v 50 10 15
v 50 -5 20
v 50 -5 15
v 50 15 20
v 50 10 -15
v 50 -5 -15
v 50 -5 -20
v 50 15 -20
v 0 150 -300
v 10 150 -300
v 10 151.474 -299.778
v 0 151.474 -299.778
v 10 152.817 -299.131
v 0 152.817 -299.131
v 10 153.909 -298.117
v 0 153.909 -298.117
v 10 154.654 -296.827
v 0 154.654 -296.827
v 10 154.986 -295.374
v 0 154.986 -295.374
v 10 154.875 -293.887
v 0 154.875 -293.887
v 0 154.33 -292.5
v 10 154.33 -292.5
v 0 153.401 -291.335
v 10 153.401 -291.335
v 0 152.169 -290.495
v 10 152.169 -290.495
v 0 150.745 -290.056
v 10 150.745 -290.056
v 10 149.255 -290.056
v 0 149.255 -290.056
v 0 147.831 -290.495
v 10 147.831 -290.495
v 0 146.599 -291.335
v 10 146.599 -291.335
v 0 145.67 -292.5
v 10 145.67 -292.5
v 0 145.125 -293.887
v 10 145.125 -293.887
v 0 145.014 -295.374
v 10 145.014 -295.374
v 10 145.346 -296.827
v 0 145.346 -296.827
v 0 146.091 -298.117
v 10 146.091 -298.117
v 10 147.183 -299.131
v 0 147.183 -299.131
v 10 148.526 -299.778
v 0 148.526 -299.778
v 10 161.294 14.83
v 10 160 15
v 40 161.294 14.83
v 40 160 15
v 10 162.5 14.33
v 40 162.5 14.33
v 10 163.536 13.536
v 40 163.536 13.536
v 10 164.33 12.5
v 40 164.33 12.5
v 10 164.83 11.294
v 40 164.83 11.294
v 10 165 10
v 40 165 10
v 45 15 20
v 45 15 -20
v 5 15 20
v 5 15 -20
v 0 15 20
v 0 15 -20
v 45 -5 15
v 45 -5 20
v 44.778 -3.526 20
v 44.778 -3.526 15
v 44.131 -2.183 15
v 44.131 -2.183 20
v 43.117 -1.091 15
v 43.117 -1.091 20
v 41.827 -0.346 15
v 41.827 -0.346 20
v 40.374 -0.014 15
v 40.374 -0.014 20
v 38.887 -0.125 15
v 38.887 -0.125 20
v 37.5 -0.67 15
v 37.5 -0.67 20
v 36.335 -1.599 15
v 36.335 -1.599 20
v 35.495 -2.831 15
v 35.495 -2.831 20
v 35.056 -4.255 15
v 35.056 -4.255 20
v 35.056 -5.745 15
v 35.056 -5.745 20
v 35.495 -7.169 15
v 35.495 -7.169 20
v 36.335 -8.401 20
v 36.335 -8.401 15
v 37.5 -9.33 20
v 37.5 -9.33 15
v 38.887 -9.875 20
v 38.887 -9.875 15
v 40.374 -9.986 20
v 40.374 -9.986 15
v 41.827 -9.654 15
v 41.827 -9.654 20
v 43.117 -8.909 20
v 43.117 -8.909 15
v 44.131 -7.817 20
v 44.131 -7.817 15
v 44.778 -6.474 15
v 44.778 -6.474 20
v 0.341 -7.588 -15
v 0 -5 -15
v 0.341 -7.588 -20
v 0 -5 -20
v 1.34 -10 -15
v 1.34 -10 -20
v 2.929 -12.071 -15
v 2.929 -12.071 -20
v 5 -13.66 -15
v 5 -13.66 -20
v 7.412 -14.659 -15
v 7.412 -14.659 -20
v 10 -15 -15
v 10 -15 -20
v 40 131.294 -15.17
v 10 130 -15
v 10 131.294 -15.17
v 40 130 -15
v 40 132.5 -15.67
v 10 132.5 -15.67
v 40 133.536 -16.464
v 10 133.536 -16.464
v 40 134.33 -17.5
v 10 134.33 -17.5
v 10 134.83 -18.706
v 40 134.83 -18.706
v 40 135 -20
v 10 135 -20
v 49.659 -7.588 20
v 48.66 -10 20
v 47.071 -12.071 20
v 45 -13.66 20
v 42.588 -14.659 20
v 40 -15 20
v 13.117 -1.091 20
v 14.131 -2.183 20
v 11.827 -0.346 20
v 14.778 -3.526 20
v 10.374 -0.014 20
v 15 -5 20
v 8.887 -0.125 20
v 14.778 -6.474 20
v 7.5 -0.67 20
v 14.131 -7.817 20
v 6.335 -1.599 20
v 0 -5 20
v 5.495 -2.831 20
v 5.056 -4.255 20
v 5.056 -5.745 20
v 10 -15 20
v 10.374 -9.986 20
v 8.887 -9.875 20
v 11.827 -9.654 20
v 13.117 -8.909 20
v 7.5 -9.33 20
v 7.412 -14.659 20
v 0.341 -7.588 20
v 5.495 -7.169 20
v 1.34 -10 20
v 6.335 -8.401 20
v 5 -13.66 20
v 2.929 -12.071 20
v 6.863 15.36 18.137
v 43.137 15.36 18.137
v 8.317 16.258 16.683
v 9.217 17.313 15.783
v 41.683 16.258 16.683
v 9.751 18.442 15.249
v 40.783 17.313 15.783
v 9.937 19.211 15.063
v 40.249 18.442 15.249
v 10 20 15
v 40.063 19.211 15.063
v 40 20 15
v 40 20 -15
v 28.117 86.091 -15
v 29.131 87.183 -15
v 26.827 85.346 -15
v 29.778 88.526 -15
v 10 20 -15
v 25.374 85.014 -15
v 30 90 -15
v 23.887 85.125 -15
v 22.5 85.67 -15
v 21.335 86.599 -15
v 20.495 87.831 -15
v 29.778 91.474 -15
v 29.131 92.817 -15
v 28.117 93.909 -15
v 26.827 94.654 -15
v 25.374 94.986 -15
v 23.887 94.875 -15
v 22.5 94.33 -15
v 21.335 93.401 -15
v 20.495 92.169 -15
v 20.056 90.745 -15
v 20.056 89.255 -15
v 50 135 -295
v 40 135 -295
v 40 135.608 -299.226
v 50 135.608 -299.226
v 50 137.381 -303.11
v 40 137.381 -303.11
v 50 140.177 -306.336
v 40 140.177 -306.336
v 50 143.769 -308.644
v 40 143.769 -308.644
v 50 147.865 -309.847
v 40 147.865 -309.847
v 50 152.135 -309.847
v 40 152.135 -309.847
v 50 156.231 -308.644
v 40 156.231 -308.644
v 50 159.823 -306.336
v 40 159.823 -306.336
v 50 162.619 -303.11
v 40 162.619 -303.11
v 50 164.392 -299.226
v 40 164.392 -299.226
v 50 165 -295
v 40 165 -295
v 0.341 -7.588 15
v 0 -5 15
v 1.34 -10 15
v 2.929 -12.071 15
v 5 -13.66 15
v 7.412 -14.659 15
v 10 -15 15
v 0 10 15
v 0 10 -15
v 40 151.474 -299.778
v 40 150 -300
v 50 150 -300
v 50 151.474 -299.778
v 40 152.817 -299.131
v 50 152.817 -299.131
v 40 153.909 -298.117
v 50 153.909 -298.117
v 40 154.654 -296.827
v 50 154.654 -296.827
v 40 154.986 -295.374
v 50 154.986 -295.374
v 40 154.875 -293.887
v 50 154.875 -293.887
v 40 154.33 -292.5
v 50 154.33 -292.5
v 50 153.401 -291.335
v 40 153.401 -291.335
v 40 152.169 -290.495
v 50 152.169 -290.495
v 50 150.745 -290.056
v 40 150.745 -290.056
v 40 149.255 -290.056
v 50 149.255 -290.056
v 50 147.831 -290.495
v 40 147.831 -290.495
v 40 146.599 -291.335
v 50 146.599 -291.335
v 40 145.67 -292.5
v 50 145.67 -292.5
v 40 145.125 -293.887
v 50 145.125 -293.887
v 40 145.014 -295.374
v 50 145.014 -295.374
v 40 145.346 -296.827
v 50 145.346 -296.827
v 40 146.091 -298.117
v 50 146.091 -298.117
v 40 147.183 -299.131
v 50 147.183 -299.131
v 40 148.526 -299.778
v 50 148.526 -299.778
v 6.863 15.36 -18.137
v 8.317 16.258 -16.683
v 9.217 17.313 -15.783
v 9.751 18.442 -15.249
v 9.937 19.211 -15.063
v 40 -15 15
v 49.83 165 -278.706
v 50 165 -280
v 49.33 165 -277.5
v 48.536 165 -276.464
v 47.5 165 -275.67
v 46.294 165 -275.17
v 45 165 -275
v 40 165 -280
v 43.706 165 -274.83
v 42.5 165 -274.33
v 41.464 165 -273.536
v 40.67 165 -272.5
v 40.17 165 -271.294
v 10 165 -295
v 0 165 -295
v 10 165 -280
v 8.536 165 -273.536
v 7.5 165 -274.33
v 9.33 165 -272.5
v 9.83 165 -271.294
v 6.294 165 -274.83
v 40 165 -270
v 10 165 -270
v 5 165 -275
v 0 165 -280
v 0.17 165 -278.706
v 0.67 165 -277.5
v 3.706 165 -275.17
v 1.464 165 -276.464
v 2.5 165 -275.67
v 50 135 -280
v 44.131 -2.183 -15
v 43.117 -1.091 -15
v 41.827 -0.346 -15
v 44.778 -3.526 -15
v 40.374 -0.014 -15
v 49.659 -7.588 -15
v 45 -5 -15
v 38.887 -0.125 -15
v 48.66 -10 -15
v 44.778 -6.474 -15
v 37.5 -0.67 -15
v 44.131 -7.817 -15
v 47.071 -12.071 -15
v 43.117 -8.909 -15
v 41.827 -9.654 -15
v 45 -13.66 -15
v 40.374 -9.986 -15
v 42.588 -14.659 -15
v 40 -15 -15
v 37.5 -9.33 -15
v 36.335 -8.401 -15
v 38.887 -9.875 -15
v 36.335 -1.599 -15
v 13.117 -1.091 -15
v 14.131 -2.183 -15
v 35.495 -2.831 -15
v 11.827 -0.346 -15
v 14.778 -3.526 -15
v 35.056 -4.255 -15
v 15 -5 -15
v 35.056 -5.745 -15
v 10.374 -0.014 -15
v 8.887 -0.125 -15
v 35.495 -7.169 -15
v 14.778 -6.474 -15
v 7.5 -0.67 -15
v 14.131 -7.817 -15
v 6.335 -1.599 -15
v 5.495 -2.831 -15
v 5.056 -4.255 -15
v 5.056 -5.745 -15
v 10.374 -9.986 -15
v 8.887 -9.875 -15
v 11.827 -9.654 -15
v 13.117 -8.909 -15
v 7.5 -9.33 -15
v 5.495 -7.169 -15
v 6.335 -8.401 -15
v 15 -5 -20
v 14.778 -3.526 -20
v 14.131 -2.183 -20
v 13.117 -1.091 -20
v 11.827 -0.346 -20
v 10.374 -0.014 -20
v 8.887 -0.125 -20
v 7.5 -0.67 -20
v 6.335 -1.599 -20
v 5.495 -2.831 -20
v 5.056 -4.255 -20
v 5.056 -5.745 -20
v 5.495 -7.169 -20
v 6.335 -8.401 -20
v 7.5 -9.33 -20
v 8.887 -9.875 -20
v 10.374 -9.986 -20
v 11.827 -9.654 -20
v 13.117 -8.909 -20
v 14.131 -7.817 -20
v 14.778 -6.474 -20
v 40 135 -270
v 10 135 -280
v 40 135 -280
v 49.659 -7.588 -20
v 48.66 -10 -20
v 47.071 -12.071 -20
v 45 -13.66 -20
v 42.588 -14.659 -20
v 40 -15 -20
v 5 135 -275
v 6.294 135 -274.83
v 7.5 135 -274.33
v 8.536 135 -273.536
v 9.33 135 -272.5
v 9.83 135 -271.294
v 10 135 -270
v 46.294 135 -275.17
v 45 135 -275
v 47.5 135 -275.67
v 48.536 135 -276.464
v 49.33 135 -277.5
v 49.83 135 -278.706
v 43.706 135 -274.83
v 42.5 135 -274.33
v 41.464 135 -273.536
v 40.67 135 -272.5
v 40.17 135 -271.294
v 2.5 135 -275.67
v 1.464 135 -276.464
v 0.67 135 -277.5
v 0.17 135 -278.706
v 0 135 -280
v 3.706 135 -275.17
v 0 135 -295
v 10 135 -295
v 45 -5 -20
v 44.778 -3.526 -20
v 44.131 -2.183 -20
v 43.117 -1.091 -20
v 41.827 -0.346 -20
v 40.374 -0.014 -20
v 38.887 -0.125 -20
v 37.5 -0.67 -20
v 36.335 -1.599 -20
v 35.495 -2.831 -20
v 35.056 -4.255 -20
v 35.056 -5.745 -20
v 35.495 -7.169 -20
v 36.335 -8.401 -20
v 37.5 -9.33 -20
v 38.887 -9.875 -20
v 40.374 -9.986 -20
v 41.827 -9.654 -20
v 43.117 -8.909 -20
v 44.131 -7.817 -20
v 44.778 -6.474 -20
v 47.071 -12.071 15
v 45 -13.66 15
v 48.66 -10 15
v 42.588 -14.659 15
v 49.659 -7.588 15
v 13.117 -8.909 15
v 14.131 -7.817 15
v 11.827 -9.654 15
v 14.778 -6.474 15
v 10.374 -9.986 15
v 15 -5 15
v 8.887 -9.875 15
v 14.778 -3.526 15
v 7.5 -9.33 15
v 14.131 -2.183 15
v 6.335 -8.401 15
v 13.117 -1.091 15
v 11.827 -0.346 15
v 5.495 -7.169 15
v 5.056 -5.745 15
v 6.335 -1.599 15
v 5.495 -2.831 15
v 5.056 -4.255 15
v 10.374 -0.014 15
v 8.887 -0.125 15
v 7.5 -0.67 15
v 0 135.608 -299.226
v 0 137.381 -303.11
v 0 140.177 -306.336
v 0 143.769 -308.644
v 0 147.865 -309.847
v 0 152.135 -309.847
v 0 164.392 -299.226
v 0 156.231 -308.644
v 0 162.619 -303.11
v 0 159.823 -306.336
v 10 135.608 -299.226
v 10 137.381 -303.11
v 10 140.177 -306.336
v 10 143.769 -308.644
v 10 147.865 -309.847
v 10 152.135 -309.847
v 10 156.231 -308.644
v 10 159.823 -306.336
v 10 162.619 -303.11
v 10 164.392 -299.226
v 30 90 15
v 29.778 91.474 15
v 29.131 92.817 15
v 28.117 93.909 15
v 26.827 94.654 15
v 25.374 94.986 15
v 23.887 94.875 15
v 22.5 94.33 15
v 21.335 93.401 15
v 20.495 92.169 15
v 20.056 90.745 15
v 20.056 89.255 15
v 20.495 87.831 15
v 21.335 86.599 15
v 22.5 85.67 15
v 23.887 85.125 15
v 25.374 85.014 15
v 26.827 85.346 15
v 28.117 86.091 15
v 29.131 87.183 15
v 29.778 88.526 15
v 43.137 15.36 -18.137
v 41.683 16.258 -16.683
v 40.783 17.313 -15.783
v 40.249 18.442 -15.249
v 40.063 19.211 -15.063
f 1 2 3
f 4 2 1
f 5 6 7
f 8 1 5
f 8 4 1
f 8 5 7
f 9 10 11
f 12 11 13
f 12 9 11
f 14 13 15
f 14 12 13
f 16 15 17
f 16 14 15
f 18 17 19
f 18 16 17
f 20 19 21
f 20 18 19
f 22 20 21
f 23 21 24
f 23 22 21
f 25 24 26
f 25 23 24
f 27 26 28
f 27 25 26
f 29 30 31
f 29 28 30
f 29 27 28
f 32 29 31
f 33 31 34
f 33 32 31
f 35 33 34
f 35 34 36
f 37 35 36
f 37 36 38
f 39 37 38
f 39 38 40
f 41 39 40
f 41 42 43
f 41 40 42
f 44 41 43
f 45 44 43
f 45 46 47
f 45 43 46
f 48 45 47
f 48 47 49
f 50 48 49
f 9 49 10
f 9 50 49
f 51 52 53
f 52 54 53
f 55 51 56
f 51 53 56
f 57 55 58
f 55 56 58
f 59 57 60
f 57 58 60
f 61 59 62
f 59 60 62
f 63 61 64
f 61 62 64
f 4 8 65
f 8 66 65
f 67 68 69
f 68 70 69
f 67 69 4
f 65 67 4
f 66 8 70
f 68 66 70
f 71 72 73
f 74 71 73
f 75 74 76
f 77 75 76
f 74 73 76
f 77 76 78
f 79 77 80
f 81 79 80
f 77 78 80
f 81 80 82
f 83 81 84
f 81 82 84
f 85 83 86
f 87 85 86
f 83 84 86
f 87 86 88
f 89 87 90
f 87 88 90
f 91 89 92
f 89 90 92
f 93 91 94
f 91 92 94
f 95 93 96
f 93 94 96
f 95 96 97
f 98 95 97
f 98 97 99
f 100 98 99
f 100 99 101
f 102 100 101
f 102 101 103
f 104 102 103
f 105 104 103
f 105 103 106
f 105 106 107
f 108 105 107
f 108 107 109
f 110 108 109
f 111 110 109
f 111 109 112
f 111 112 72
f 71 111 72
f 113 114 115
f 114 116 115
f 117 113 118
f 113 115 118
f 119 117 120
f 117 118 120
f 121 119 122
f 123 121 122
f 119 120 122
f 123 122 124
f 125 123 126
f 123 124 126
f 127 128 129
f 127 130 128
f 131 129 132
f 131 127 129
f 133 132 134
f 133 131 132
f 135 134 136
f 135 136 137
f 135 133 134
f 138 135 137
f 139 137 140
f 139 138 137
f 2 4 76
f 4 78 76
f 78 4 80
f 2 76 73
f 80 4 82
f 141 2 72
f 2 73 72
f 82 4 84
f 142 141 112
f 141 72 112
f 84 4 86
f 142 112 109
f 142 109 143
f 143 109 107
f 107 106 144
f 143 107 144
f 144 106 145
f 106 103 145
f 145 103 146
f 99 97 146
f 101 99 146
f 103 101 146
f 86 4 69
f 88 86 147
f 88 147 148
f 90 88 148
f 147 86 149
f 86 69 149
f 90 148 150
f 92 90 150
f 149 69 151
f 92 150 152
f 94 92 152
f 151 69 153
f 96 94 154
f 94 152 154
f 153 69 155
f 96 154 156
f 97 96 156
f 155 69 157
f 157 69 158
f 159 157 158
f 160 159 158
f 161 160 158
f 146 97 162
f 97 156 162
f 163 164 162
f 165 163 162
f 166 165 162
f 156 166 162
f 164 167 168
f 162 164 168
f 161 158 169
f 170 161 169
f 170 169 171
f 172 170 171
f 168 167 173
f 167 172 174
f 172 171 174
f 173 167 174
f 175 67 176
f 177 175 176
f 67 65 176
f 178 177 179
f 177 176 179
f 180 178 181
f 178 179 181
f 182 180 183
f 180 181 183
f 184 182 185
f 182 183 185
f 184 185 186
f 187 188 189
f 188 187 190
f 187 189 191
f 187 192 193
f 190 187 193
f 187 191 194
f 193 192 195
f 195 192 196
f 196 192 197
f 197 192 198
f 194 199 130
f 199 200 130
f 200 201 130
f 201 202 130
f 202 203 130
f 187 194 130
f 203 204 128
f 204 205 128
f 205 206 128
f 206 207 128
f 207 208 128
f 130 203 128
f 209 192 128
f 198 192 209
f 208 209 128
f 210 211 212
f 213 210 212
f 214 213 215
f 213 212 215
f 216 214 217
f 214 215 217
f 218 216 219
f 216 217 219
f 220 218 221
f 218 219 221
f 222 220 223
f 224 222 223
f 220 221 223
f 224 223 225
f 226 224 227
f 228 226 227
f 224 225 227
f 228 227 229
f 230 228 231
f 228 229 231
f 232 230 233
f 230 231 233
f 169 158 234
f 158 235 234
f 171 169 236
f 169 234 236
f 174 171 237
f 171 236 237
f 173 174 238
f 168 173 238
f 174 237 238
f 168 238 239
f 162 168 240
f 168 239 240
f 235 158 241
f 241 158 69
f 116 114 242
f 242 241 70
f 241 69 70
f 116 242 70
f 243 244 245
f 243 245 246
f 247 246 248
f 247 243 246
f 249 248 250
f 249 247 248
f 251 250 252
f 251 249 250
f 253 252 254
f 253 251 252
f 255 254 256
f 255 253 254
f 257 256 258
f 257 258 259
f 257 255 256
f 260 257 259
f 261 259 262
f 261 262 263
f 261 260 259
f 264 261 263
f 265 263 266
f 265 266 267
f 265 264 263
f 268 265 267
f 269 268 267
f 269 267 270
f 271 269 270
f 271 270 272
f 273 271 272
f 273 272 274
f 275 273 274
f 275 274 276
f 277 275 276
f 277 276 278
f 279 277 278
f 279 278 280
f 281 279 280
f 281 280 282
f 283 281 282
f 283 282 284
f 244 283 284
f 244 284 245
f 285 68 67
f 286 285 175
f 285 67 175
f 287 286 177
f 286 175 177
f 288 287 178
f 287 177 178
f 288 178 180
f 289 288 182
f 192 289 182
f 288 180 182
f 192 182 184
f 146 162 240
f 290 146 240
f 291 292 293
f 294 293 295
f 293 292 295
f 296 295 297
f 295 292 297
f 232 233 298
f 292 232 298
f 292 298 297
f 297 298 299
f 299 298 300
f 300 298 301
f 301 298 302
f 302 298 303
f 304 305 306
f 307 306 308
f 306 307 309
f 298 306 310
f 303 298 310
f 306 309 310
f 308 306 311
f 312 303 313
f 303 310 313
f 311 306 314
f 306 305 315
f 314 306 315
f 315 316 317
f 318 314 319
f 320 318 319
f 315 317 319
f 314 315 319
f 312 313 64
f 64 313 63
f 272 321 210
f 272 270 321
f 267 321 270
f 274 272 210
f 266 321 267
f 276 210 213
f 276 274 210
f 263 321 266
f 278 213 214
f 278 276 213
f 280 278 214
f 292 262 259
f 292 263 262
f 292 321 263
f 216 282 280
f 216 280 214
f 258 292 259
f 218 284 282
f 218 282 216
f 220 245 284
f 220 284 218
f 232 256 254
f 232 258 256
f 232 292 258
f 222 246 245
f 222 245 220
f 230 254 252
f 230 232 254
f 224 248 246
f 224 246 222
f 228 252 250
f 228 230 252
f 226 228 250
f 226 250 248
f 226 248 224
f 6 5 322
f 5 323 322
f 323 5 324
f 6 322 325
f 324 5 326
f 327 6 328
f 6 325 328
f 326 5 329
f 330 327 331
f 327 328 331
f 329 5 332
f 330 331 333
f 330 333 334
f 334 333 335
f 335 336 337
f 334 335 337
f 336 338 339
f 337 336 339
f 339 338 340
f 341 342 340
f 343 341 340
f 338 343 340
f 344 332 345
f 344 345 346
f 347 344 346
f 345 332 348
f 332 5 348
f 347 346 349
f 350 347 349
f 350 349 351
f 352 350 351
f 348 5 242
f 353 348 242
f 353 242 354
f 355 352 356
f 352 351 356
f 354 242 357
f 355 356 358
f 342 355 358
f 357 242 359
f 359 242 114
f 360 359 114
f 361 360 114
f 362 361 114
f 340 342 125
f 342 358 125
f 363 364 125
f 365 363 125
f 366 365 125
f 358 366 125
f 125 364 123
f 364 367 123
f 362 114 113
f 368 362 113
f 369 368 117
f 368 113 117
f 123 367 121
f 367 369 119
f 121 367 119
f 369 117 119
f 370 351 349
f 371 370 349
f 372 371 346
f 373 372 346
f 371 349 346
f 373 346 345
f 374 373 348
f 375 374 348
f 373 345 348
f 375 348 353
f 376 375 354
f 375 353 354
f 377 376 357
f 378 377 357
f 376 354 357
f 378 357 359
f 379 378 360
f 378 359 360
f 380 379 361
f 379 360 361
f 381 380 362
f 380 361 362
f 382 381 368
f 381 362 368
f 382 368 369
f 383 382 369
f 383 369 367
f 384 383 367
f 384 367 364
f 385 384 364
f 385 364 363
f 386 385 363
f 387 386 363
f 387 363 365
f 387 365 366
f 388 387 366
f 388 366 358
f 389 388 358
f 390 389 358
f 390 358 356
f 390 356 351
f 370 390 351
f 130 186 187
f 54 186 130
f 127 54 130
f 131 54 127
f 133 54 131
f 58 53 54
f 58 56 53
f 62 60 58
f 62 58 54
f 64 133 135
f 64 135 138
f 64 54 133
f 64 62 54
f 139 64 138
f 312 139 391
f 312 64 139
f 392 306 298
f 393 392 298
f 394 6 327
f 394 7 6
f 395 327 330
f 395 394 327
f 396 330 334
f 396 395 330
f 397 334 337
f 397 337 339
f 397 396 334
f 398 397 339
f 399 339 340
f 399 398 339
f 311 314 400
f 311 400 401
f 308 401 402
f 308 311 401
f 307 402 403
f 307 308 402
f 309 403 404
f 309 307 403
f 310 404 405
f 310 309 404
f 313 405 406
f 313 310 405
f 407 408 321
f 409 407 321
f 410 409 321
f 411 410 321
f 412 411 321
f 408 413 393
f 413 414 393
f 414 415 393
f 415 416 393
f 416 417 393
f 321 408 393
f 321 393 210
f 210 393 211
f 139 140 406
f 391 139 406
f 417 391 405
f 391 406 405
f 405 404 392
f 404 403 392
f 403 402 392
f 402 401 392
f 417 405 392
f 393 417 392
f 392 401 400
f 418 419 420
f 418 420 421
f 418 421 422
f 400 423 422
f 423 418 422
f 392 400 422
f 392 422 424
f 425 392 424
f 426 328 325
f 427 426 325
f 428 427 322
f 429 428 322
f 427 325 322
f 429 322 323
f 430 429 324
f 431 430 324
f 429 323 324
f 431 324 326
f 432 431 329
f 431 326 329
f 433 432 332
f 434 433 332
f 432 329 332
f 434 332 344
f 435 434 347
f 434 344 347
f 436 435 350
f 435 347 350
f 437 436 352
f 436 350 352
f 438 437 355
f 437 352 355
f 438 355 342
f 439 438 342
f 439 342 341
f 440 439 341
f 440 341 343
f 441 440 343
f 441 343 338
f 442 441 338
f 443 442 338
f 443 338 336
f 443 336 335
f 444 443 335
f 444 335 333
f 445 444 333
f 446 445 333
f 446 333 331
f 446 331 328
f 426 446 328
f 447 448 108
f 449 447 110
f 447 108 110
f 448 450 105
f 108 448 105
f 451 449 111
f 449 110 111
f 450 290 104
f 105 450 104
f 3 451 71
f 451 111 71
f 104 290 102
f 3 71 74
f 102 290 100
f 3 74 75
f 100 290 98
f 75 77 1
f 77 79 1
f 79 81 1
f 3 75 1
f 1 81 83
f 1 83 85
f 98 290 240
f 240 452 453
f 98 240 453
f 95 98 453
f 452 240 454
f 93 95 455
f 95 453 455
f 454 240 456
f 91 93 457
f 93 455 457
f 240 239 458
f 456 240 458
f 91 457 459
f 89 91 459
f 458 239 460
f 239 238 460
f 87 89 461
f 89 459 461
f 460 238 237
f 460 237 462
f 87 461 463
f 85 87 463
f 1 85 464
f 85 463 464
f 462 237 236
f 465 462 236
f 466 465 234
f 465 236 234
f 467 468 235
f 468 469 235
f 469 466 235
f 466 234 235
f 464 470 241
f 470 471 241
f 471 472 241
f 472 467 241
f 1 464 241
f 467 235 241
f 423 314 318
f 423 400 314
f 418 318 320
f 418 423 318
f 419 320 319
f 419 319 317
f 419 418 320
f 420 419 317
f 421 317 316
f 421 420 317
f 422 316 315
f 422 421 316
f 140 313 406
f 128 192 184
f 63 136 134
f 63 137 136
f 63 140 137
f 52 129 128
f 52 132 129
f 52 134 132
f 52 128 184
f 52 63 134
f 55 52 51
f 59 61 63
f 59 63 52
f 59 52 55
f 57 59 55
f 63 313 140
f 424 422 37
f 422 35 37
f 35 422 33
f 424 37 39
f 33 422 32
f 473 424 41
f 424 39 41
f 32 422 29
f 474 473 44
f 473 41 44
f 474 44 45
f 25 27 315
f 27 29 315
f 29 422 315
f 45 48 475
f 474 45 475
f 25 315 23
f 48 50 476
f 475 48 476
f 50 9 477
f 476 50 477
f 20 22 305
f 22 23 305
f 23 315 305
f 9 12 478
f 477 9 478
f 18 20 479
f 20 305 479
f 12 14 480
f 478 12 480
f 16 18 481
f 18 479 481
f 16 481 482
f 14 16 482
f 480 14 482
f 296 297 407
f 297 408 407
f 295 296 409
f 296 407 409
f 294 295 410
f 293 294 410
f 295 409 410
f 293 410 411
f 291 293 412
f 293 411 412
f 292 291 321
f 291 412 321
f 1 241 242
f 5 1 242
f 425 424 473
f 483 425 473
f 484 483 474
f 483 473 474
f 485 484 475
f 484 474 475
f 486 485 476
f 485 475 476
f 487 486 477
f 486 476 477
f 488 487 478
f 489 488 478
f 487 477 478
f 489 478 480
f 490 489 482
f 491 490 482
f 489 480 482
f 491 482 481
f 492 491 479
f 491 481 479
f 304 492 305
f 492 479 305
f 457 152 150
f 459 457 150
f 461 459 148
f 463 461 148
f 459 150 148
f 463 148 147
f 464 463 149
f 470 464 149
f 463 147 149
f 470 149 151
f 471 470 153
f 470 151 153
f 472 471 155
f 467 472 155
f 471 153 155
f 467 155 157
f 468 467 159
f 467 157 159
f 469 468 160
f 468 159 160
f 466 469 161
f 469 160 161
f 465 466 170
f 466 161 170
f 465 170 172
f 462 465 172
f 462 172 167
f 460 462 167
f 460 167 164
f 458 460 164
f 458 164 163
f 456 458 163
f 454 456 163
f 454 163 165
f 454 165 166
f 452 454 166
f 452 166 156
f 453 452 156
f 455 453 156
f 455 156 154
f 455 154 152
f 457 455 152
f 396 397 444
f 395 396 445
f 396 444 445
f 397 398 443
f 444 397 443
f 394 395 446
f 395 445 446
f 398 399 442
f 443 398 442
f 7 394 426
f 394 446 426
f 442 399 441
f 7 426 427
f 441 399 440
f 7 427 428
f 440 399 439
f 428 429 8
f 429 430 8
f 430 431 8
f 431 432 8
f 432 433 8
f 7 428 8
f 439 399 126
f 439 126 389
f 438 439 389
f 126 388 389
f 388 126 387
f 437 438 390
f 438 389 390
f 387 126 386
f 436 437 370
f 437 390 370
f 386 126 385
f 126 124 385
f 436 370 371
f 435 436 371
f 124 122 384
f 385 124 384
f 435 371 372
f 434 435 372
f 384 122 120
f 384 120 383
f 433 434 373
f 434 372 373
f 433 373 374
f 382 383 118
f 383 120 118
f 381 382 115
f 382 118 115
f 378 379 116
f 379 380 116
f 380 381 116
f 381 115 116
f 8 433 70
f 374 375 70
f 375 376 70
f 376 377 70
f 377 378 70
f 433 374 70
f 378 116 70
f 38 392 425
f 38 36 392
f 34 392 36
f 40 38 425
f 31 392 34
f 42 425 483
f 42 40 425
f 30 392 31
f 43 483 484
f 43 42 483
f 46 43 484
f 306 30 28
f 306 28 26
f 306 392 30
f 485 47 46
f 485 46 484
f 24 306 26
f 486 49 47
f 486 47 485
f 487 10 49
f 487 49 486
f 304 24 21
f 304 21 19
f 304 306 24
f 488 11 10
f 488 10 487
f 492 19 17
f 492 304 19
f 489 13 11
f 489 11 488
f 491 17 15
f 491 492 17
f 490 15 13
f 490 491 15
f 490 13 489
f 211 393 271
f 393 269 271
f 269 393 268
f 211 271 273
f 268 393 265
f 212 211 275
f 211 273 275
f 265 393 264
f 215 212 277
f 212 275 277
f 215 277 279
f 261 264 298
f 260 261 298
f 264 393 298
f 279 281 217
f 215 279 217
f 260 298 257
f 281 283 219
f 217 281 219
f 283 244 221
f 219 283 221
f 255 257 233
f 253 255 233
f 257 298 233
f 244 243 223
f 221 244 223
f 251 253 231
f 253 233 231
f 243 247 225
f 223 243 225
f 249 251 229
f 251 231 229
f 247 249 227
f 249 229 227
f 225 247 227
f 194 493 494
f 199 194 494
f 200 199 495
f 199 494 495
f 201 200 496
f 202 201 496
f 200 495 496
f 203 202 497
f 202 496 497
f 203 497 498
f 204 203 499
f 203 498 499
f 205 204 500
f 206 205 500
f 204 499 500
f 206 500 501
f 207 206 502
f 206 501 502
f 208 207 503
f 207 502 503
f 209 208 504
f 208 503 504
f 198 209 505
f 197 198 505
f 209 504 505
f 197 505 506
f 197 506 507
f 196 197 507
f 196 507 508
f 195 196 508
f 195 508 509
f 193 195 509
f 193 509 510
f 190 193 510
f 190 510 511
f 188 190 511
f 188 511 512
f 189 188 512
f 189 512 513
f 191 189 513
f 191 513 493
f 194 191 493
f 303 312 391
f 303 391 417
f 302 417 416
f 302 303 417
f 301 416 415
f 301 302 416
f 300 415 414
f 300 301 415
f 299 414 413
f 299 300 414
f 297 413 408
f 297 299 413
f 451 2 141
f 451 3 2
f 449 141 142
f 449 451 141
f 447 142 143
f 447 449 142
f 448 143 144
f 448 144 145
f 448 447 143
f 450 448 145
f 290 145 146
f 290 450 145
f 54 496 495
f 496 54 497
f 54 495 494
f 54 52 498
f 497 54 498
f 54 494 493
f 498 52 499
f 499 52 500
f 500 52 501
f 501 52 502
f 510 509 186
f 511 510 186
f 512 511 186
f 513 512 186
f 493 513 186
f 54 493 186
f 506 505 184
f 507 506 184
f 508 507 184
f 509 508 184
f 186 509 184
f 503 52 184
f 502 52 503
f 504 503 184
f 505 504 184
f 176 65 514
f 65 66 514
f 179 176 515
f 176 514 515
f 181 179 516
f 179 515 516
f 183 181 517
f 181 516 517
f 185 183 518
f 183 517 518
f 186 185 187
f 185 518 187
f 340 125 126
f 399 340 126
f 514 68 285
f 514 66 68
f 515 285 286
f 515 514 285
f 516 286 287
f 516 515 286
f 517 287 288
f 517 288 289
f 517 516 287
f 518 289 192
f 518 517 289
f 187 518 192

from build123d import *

# Parameters (mm, degrees)
SKETCH1_R           = 5
BOSS_EXTRUDE1_DEPTH = 50
SKETCH2_W           = 30
SKETCH2_H           = 30
CUT_EXTRUDE1_DEPTH  = 150
SKETCH3_R           = 5
CUT_EXTRUDE2_DEPTH  = 373.323783823
FILLET1_R           = 10
FILLET2_R           = 5
FILLET3_R           = 5
SKETCH4_R           = 5
CUT_EXTRUDE3_DEPTH  = 150


with BuildPart() as part:
    # Sketch1 → Boss-Extrude1 (new body)
    with BuildSketch(Plane(origin=(0, 0, 0), x_dir=(0, 0, -1), z_dir=(1, 0, 0))):
        with BuildLine():
            Line((-15, 165), (-15, 15))
            Line((-15, 15), (-20, 15))
            Line((-20, 15), (-20, -15))
            Line((-20, -15), (-15, -15))
            Line((-15, -15), (-15, 10))
            Line((-15, 10), (15, 10))
            Line((15, 10), (15, -15))
            Line((15, -15), (20, -15))
            Line((20, -15), (20, 15))
            Line((20, 15), (15, 15))
            Line((15, 15), (15, 135))
            Line((15, 135), (295, 135))
            ThreePointArc((295, 135), (310, 150), (295, 165))
            Line((295, 165), (-15, 165))
        make_face()
        with Locations((295, 150)):
            Circle(SKETCH1_R, mode=Mode.SUBTRACT)
    extrude(amount=BOSS_EXTRUDE1_DEPTH)

    # Sketch2 → Cut-Extrude1 (cut)
    with BuildSketch(Plane(origin=(0, 165, 0), x_dir=(1, 0, 0), z_dir=(0, 1, 0))):
        with Locations((25, 295)):
            Rectangle(SKETCH2_W, SKETCH2_H)
        with BuildLine():
            Line((0, 275), (5, 275))
            ThreePointArc((5, 275), (8.535533906, 273.535533906), (10, 270))
            Line((10, 270), (10, -15))
            Line((10, -15), (0, -15))
            Line((0, -15), (0, 275))
        make_face()
        with BuildLine():
            Line((50, -15), (40, -15))
            Line((40, -15), (40, 270))
            ThreePointArc((40, 270), (41.464466094, 273.535533906), (45, 275))
            Line((45, 275), (50, 275))
            Line((50, 275), (50, -15))
        make_face()
    extrude(amount=-CUT_EXTRUDE1_DEPTH, mode=Mode.SUBTRACT)

    # Sketch3 → Cut-Extrude2 (cut, through all)
    with BuildSketch(Plane.XY.offset(20)):
        with Locations((10, -5)):
            Circle(SKETCH3_R)
        with Locations((40, -5)):
            Circle(SKETCH3_R)
    extrude(amount=-CUT_EXTRUDE2_DEPTH, mode=Mode.SUBTRACT)

    # Fillet1
    fillet1_edges = [part.edges().sort_by_distance(p)[0] for p in [
        (0, -15, -17.5),
        (50, -15, 17.5),
        (0, -15, 17.5),
        (50, -15, -17.5),
    ]]
    fillet(fillet1_edges, radius=FILLET1_R)

    # Fillet2
    fillet2_edges = [part.edges().sort_by_distance(p)[0] for p in [
        (25, 165, 15),
        (25, 135, -15),
        (25, 15, -15),
        (25, 15, 15),
        (10, 15, 0),
        (40, 15, 0),
    ]]
    fillet(fillet2_edges, radius=FILLET2_R - 0.0001)  # a hair under: the kernel refuses the full size

    # Fillet3
    fillet3_edges = [part.edges().sort_by_distance(p)[0] for p in [
        (0, 150, -275),
        (50, 150, -275),
    ]]
    fillet(fillet3_edges, radius=FILLET3_R - 0.0001)  # a hair under: the kernel refuses the full size

    # Sketch4 → Cut-Extrude3 (cut)
    with BuildSketch(Plane.XY.offset(15)):
        with Locations((25, 90)):
            Circle(SKETCH4_R)
    extrude(amount=-CUT_EXTRUDE3_DEPTH, mode=Mode.SUBTRACT)


solid = part.part
